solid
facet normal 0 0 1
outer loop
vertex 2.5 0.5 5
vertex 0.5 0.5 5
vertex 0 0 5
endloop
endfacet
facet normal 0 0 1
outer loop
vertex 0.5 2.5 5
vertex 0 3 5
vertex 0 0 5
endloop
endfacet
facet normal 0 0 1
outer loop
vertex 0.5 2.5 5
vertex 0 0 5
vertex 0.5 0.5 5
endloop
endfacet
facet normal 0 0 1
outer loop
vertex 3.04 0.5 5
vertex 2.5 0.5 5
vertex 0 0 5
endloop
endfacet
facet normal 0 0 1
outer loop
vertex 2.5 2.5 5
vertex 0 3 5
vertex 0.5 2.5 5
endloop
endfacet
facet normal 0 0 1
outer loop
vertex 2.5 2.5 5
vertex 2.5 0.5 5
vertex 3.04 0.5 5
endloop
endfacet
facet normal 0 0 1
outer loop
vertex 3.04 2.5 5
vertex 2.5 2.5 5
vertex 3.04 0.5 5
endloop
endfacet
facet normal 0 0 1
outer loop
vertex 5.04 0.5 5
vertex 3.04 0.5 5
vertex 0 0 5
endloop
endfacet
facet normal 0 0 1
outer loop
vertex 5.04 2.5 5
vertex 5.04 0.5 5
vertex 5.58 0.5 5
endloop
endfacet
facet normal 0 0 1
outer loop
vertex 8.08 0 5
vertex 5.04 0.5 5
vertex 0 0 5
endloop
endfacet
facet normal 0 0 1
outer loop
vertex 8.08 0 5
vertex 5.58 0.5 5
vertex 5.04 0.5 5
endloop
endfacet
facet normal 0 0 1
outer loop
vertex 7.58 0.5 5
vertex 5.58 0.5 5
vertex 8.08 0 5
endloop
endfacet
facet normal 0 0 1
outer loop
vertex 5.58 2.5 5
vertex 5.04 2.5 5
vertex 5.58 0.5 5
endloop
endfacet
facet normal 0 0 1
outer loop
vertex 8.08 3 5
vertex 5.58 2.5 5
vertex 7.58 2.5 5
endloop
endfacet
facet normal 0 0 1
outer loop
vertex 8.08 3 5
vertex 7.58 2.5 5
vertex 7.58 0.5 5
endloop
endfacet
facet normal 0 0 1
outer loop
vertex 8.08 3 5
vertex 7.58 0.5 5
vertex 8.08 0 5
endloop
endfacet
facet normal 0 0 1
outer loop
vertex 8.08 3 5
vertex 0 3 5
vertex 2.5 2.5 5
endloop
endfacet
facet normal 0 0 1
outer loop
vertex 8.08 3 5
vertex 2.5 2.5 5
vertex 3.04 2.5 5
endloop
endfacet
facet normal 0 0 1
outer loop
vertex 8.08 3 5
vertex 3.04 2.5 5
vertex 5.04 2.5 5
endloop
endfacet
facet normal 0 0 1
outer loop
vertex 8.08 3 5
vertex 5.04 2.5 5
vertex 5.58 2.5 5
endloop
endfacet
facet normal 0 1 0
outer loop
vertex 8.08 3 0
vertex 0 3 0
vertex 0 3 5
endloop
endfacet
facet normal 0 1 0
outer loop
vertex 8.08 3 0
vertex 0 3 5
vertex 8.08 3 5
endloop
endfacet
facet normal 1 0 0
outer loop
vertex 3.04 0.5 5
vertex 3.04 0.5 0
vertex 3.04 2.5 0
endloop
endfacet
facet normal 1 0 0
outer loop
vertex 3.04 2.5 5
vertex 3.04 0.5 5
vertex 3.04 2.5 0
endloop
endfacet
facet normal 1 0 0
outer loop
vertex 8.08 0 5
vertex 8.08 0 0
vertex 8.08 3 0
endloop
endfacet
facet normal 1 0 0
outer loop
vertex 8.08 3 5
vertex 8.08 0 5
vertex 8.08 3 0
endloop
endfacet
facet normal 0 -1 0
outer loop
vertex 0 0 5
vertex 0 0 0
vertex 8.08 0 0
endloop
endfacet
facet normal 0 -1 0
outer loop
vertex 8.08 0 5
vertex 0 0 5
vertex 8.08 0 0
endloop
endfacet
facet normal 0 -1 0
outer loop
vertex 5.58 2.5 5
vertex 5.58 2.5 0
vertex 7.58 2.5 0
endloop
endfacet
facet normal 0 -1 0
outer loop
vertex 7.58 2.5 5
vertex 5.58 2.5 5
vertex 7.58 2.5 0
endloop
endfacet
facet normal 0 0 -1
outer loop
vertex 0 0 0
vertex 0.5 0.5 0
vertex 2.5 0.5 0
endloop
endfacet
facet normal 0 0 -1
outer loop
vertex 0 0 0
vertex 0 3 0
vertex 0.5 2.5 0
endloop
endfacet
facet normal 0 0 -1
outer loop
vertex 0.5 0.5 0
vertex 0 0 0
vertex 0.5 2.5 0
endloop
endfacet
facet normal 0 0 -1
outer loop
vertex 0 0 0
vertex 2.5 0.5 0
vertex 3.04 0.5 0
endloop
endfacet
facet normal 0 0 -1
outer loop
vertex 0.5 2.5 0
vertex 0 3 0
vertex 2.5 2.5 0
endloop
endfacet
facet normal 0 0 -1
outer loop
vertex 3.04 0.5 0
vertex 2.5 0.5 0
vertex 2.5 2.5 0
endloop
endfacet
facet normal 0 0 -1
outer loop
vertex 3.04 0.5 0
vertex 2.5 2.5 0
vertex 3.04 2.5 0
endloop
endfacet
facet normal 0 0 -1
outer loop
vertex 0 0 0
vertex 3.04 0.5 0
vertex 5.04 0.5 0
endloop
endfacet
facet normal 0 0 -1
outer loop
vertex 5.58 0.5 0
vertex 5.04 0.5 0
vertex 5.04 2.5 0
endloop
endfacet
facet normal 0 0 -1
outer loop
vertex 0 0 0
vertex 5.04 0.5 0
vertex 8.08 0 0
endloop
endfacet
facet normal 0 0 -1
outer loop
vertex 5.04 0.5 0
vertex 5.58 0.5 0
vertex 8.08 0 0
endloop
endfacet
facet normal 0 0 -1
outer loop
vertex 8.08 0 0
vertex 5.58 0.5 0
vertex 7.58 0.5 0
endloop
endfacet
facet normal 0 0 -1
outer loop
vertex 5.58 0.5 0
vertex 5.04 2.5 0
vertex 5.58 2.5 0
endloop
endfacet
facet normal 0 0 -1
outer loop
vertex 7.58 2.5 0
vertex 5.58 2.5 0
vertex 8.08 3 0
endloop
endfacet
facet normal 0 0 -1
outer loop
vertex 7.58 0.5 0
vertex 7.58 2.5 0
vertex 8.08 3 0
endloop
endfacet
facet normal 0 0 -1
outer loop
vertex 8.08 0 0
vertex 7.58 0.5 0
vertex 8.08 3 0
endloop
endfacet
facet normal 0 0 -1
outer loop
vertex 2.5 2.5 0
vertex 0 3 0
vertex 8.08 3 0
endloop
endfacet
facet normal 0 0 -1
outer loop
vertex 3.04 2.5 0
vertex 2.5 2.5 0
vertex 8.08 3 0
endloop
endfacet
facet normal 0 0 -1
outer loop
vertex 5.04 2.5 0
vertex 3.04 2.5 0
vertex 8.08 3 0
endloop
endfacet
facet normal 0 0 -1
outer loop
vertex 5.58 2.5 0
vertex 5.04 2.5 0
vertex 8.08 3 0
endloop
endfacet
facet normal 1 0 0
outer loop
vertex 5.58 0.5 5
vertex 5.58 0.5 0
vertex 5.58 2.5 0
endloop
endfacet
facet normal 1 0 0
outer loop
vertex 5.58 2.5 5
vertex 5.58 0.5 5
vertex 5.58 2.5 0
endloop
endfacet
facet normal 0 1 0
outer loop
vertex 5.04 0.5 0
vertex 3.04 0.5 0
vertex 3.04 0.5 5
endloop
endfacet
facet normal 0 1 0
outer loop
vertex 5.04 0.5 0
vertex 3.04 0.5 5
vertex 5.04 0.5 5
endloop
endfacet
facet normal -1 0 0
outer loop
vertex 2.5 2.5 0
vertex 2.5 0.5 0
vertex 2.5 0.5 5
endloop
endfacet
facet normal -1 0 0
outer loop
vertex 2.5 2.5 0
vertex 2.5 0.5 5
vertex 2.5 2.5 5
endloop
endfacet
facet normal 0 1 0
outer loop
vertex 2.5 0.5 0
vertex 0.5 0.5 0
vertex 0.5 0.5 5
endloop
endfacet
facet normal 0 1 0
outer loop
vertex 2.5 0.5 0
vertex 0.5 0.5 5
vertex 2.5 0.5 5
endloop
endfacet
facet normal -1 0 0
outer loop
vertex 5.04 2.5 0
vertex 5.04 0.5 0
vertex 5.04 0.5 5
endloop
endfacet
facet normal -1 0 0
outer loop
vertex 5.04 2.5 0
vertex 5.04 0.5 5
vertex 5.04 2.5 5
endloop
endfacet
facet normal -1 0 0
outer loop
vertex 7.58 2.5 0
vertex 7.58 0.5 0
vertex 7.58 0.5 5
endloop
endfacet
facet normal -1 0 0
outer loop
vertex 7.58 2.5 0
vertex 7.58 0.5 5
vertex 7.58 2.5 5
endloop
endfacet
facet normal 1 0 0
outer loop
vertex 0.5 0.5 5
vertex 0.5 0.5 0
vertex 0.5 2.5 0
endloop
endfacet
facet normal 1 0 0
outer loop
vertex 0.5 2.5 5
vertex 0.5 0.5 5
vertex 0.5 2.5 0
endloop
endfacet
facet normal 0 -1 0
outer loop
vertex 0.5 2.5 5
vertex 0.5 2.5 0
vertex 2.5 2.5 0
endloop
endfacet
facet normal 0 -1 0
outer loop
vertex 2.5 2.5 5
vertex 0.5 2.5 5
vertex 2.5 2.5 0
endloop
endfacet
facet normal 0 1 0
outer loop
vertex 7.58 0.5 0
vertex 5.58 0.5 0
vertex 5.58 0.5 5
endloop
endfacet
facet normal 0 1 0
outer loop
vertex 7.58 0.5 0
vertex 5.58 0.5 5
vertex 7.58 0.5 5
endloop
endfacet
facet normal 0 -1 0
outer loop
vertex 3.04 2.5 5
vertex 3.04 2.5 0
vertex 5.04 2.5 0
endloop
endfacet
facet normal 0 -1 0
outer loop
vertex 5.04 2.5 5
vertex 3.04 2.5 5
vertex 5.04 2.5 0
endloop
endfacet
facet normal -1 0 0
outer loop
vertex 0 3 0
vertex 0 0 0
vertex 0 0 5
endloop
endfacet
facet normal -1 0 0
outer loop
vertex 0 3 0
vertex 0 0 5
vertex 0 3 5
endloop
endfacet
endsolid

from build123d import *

# Parameters (mm, degrees)
F0_W     = 8.08
F0_H     = 3
F0_W_2   = 2
F0_H_2   = 2
F1_DEPTH = 5


with BuildPart() as f1:
    # F0 (on Top) → F1 (new body)
    with BuildSketch(Plane.XY):
        with Locations((4.04, 1.5)):
            Rectangle(F0_W, F0_H)
        with Locations((1.5, 1.5)):
            Rectangle(F0_W_2, F0_H_2, mode=Mode.SUBTRACT)
        with Locations((4.04, 1.5)):
            Rectangle(F0_W_2, F0_H_2, mode=Mode.SUBTRACT)
        with Locations((6.58, 1.5)):
            Rectangle(F0_W_2, F0_H_2, mode=Mode.SUBTRACT)
    extrude(amount=F1_DEPTH)


solid = f1.part
